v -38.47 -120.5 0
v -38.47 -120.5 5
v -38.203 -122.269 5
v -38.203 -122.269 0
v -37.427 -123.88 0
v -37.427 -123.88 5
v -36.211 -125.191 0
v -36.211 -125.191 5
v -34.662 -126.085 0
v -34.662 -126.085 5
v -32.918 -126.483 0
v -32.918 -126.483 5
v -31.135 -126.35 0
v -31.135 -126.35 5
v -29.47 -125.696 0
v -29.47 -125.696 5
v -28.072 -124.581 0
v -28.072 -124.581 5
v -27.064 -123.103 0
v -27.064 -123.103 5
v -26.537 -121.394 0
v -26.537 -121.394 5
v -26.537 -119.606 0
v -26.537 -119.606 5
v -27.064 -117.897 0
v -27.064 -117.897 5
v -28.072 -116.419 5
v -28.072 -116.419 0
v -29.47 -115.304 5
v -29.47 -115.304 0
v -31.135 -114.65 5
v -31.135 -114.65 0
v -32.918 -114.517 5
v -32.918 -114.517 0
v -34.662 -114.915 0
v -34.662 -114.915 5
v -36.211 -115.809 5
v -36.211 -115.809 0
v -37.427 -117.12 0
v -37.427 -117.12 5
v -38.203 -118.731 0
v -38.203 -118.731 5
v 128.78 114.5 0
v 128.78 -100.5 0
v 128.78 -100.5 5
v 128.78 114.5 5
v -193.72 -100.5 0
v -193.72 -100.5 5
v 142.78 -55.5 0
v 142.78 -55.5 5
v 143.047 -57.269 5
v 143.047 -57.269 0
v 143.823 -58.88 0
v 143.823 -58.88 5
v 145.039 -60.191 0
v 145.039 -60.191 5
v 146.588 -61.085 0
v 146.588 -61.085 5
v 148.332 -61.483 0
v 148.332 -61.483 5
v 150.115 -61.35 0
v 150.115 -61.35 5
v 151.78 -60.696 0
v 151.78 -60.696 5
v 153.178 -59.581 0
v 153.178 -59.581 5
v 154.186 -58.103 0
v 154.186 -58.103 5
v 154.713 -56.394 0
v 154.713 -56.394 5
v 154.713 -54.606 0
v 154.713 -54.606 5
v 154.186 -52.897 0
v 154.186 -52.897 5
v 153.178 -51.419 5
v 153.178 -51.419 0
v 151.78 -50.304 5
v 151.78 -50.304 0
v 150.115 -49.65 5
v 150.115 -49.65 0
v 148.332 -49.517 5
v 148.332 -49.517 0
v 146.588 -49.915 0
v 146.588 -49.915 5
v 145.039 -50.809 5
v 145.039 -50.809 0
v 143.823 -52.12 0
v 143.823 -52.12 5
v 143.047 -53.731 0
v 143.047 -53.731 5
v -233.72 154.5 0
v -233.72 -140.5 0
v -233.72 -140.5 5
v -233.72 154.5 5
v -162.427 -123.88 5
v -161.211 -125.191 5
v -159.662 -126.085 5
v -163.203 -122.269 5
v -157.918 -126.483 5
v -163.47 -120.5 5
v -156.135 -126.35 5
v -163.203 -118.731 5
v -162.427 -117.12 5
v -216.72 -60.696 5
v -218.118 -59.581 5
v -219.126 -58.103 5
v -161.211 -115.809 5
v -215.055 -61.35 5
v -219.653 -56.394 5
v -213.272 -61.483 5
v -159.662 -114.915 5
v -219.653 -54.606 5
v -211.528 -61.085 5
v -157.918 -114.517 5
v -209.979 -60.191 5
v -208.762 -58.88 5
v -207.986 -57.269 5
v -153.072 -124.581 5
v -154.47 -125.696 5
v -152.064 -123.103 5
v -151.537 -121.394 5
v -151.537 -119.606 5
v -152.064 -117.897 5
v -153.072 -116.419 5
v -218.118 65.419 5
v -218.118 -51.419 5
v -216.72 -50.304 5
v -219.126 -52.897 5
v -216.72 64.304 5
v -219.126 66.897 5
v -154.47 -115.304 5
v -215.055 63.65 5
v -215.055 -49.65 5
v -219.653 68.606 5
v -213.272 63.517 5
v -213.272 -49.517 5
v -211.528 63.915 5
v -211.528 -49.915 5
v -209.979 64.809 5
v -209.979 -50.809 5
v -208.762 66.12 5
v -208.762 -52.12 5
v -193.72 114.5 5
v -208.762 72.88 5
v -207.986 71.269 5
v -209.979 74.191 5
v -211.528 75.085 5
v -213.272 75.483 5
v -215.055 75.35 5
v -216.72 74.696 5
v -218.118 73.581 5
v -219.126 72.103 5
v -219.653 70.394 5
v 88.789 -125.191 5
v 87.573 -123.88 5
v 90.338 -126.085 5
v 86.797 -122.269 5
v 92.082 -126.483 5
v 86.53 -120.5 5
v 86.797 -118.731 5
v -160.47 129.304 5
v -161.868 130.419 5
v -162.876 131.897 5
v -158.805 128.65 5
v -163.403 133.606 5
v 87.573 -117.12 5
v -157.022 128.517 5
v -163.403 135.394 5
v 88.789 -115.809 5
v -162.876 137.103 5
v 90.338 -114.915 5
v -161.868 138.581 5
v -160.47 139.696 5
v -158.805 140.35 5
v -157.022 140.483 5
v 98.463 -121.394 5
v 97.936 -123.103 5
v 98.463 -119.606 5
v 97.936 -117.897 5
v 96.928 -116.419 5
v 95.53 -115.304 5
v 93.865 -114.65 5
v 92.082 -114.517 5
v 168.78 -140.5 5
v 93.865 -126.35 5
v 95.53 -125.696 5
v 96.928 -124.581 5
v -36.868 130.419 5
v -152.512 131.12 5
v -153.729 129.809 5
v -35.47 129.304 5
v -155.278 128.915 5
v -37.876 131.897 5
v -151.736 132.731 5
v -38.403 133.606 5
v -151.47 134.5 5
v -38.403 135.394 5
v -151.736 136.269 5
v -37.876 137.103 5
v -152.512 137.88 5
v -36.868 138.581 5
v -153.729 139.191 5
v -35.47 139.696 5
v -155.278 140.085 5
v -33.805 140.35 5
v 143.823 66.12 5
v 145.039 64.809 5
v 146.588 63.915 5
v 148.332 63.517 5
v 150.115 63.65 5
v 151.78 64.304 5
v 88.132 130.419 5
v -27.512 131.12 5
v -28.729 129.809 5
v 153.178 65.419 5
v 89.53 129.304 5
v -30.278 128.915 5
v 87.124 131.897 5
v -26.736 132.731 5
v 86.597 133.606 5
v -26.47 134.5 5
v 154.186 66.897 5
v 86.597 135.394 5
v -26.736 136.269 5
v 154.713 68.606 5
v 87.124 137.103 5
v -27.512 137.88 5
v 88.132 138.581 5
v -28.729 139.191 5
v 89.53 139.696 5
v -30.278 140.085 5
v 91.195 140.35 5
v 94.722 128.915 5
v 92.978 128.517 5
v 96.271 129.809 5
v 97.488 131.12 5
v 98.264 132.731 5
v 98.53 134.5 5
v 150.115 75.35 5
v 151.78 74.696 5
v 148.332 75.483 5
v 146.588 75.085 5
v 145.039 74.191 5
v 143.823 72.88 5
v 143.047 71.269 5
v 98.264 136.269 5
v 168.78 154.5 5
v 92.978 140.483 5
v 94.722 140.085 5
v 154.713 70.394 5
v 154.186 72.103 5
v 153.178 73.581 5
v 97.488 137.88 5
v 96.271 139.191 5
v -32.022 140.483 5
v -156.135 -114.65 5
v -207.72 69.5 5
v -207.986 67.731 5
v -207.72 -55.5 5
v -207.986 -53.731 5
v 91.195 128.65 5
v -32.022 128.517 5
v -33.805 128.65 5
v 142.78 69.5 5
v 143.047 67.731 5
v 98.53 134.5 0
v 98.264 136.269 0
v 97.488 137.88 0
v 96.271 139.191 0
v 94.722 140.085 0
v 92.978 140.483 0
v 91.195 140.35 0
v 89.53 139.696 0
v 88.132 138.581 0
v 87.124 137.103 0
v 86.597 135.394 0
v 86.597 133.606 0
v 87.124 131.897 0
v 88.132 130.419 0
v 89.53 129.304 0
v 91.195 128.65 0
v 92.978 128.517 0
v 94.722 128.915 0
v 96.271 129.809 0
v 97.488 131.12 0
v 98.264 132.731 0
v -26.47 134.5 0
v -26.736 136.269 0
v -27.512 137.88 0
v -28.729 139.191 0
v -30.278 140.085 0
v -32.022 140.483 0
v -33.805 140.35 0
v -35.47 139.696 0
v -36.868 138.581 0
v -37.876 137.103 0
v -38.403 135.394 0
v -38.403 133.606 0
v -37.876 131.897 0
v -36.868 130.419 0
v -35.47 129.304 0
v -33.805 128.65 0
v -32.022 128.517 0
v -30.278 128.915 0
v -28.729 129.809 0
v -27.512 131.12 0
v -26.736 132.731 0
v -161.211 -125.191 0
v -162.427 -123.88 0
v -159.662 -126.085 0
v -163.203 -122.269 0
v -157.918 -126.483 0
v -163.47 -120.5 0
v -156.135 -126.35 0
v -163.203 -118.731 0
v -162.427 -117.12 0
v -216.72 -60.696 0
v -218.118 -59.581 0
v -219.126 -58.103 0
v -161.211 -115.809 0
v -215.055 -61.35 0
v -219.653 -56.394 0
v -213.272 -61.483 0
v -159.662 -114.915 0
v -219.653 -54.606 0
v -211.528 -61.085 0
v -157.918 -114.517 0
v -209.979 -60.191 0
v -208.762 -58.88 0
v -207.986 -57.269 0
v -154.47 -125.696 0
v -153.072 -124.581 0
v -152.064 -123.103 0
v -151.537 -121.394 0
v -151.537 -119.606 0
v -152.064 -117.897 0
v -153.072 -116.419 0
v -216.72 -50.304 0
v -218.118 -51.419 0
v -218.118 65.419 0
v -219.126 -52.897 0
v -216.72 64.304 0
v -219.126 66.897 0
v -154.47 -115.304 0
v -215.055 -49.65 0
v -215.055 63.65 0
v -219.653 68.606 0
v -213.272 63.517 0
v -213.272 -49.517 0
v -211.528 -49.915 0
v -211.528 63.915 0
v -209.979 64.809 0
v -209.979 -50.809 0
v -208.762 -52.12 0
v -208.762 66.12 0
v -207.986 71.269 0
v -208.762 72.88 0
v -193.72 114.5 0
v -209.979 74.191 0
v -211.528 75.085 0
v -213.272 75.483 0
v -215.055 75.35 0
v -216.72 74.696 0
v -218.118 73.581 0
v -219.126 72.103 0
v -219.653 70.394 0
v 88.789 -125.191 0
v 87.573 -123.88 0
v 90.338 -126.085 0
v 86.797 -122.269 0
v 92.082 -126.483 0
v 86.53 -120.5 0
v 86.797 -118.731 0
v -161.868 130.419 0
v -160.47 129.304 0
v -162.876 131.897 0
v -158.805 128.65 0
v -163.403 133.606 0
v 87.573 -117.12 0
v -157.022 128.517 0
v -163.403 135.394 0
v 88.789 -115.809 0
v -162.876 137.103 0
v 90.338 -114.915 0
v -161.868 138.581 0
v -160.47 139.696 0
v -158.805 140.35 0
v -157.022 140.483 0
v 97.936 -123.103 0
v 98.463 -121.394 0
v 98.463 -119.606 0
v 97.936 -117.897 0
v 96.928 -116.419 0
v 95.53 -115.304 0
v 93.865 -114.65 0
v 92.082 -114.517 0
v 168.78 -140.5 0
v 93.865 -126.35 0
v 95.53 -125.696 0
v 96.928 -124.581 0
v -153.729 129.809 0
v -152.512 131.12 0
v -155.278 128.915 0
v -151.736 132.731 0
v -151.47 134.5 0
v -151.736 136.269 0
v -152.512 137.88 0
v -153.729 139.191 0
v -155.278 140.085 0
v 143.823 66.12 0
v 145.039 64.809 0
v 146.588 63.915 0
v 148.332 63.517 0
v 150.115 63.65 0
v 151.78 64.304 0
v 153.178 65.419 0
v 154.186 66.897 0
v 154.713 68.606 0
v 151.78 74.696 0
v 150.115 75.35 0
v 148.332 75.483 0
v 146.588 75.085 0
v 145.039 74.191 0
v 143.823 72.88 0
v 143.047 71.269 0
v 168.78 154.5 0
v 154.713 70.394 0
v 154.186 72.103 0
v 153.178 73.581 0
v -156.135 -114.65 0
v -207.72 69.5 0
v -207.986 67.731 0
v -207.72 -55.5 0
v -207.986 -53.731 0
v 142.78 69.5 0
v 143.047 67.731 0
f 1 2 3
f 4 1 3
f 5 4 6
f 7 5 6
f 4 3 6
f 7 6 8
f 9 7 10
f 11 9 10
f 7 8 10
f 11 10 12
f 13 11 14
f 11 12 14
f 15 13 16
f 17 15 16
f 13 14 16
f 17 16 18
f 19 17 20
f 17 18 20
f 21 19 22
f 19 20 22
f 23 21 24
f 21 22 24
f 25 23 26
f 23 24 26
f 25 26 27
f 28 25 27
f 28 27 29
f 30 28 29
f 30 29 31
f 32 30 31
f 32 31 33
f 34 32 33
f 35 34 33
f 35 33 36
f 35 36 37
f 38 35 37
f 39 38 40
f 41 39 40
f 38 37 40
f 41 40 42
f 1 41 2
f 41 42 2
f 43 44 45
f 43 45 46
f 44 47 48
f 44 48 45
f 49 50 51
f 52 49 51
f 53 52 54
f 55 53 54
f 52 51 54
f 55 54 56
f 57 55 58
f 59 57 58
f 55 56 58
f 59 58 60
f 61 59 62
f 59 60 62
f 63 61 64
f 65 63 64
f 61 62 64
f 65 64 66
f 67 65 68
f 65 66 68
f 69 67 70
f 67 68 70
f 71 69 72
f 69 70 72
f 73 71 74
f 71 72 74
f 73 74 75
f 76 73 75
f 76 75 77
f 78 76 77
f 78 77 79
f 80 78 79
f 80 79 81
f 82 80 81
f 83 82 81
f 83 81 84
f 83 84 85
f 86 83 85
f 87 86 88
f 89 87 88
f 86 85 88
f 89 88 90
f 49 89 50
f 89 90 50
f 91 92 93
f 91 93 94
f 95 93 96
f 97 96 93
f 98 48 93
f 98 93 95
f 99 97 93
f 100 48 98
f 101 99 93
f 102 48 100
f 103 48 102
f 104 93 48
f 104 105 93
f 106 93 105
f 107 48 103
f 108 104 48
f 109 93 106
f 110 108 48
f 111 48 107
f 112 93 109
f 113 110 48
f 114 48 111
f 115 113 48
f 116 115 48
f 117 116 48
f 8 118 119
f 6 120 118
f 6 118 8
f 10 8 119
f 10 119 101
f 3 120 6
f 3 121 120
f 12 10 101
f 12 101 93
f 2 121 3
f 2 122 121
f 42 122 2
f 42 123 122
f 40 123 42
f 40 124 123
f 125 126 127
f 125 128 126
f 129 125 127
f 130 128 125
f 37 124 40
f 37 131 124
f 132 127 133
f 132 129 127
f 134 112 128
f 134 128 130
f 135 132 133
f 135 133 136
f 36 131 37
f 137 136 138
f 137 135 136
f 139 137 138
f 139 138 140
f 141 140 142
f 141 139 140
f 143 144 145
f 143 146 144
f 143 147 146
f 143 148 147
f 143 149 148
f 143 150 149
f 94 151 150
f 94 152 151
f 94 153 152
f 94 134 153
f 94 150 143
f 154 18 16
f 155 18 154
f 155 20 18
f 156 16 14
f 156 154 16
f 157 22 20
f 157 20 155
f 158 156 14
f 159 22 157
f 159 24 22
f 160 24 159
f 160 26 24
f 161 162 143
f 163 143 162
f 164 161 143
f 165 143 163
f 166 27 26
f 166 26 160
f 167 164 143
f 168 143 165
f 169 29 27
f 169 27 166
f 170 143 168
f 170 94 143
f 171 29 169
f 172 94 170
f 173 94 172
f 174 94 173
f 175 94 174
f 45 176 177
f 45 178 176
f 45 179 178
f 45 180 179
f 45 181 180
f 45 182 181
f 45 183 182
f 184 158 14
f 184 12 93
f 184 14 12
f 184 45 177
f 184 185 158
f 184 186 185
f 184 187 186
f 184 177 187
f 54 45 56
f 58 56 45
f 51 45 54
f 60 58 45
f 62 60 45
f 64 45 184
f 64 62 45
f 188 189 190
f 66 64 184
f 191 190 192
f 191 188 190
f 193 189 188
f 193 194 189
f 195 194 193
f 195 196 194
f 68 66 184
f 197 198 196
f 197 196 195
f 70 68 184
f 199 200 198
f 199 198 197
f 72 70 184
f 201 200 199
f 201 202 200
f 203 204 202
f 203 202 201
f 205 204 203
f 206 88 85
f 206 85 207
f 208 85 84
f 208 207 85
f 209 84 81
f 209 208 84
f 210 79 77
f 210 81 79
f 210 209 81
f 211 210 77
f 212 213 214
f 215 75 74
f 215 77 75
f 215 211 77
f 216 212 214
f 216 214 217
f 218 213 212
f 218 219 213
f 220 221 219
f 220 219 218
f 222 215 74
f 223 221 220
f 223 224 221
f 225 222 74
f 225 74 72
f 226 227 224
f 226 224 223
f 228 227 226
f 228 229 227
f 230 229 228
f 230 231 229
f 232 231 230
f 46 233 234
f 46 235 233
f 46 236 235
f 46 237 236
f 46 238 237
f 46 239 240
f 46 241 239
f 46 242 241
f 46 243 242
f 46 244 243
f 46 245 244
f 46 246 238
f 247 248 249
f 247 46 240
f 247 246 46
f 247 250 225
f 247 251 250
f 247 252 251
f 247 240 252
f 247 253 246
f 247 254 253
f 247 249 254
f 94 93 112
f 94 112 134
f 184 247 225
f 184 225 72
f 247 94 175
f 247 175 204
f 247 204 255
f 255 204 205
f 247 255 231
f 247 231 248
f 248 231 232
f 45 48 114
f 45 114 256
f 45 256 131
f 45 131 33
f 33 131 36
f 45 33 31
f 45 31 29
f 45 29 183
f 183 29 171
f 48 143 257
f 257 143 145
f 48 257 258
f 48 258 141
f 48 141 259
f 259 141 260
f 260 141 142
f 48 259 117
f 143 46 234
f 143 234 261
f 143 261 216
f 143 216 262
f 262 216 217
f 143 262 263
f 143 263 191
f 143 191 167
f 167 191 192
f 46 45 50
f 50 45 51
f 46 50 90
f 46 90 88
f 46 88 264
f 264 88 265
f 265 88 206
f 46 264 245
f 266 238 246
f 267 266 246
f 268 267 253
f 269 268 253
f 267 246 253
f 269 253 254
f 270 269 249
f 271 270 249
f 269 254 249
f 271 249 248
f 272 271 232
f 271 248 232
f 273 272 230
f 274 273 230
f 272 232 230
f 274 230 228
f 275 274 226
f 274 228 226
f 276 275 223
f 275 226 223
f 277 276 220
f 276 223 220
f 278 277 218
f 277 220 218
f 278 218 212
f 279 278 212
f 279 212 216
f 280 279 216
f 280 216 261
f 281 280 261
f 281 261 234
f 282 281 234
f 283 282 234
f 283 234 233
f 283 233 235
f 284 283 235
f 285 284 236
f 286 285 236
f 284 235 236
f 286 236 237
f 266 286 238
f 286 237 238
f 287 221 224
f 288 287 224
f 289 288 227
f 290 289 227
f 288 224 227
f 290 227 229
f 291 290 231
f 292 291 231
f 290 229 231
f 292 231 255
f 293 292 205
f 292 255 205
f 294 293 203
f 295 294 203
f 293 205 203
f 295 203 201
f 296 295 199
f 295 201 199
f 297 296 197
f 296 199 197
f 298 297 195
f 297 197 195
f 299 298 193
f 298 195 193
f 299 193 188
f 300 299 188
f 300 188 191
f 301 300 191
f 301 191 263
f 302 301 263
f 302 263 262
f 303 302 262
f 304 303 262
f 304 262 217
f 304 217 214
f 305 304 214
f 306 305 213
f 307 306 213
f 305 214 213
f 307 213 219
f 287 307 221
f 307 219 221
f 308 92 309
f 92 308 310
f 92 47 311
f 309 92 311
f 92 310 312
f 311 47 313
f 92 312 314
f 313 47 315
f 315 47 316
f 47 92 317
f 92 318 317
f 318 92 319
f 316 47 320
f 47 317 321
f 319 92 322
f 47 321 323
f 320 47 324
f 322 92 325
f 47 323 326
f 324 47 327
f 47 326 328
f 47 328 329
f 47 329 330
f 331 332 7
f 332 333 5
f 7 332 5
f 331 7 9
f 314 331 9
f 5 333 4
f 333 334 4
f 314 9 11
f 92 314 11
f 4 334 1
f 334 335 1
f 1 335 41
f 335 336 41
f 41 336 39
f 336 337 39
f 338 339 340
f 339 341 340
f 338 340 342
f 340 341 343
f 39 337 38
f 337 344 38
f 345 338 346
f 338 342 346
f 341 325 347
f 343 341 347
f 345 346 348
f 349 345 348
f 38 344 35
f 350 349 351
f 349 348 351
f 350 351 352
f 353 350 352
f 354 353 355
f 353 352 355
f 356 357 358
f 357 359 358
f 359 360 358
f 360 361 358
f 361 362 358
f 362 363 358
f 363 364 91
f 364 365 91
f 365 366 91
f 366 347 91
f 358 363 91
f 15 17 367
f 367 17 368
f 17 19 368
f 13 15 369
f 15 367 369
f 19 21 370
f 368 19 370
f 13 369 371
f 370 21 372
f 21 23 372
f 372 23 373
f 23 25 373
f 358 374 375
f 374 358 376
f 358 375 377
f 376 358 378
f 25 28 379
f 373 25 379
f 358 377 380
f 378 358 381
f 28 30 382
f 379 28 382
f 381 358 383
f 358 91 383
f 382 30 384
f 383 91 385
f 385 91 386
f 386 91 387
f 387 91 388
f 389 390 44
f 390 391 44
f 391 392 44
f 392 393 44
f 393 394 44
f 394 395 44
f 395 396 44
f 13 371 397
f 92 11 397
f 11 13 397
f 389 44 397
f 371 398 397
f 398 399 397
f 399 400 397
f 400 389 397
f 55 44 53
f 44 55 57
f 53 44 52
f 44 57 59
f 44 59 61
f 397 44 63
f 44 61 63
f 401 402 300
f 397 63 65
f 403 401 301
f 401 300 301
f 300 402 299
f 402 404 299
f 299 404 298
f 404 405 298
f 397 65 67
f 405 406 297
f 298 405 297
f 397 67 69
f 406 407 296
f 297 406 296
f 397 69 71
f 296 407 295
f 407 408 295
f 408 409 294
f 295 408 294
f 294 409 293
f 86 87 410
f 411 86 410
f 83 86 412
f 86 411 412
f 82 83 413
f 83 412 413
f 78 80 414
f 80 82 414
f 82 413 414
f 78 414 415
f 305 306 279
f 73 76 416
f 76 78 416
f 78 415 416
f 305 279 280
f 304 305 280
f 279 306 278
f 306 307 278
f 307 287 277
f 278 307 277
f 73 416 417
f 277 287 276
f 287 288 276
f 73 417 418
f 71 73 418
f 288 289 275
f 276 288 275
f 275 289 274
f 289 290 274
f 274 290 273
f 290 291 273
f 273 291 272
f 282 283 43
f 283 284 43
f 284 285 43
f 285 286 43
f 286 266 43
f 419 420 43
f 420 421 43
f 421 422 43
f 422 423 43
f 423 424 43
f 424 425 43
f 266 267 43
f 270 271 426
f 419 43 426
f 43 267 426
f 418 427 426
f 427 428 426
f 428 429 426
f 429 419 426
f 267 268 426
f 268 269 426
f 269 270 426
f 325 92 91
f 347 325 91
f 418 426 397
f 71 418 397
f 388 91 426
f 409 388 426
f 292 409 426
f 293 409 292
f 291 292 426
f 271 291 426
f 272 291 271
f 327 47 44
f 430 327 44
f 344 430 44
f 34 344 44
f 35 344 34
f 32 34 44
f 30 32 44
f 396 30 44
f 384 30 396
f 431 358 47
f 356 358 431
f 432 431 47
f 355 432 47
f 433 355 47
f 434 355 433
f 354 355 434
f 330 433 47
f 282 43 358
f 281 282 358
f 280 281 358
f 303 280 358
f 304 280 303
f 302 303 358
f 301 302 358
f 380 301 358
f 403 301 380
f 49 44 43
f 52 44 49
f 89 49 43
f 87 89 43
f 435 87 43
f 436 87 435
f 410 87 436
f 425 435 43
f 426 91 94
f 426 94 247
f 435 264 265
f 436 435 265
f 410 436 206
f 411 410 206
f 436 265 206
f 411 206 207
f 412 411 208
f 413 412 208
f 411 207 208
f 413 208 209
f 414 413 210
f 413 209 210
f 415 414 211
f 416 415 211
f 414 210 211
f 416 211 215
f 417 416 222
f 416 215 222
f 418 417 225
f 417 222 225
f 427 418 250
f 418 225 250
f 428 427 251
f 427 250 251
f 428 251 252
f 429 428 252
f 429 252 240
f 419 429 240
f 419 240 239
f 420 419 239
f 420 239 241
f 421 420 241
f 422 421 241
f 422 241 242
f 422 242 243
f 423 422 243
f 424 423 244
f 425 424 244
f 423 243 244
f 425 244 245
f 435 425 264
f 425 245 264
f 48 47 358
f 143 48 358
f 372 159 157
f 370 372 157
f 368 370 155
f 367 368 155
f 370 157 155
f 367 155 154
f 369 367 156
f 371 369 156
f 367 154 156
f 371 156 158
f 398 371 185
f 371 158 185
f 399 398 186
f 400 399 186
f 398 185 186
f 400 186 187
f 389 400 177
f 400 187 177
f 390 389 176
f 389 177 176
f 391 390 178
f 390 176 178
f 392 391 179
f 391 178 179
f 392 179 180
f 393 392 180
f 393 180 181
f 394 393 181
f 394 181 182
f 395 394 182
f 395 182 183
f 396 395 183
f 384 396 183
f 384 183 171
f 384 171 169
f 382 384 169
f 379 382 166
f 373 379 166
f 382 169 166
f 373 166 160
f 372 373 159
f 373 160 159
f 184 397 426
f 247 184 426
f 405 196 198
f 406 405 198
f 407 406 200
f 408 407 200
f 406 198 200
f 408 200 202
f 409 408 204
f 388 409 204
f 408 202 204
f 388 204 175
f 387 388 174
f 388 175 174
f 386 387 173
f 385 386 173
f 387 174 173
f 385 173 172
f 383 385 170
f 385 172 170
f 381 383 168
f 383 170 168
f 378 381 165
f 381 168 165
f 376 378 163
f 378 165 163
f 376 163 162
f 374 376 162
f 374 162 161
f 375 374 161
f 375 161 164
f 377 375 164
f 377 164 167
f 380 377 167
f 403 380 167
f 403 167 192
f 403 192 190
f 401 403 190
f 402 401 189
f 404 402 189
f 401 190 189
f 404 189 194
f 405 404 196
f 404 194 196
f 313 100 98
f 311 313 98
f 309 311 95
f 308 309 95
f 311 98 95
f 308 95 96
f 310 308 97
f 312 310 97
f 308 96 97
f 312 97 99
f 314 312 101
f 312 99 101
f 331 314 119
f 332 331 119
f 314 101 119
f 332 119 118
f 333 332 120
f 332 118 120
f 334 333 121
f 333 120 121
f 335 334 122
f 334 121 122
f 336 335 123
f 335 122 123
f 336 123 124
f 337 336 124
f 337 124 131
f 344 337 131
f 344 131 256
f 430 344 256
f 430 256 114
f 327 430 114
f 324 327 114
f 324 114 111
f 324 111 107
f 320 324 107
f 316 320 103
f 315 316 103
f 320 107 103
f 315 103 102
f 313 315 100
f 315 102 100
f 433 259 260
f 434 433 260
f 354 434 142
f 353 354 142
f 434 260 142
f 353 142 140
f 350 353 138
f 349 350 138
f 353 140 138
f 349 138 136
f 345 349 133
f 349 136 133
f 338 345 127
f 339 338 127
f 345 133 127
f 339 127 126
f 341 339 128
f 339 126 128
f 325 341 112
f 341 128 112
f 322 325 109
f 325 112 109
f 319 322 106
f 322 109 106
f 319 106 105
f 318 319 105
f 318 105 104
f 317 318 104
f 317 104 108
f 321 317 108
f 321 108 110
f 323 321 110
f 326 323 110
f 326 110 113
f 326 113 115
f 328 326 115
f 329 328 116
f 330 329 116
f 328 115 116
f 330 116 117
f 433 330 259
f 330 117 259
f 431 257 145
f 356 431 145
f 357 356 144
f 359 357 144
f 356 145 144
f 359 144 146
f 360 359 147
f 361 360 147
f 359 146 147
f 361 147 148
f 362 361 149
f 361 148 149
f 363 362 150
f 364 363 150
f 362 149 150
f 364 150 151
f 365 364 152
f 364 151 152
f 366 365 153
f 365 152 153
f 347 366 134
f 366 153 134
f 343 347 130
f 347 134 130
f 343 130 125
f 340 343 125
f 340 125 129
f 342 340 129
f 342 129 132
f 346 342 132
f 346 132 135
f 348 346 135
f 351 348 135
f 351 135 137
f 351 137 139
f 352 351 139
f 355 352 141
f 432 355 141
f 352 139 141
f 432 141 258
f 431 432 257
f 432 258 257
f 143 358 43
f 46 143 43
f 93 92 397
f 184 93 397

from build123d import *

# Parameters (mm, degrees)
SKETCH1_W           = 402.5
SKETCH1_H           = 295
SKETCH1_W_2         = 322.5
SKETCH1_H_2         = 215
BOSS_EXTRUDE1_DEPTH = 5
SKETCH2_R           = 6
CUT_EXTRUDE1_DEPTH  = 5


with BuildPart() as part:
    # Sketch1 → Boss-Extrude1 (new body)
    with BuildSketch(Plane.XY):
        with Locations((-32.469887955, 7)):
            Rectangle(SKETCH1_W, SKETCH1_H)
        with Locations((-32.469887955, 7)):
            Rectangle(SKETCH1_W_2, SKETCH1_H_2, mode=Mode.SUBTRACT)
    extrude(amount=BOSS_EXTRUDE1_DEPTH)

    # Sketch2 → Cut-Extrude1 (cut)
    with BuildSketch(Plane.XY.offset(5)):
        with Locations((-213.719887955, 69.5)):
            Circle(SKETCH2_R)
        with Locations((-213.719887955, -55.5)):
            Circle(SKETCH2_R)
        with Locations(Location((-157.469887955, -120.5, 0), (0, 0, 180))):
            Circle(SKETCH2_R)
        with Locations(Location((-32.469887955, -120.5, 0), (0, 0, 180))):
            Circle(SKETCH2_R)
        with Locations(Location((92.530112045, -120.5, 0), (0, 0, 180))):
            Circle(SKETCH2_R)
        with Locations((92.530112045, 134.5)):
            Circle(SKETCH2_R)
        with Locations((-32.469887955, 134.5)):
            Circle(SKETCH2_R)
        with Locations((-157.469887955, 134.5)):
            Circle(SKETCH2_R)
        with Locations(Location((148.780112045, -55.5, 0), (0, 0, 180))):
            Circle(SKETCH2_R)
        with Locations(Location((148.780112045, 69.5, 0), (0, 0, 180))):
            Circle(SKETCH2_R)
    extrude(amount=-CUT_EXTRUDE1_DEPTH, mode=Mode.SUBTRACT)


solid = part.part
